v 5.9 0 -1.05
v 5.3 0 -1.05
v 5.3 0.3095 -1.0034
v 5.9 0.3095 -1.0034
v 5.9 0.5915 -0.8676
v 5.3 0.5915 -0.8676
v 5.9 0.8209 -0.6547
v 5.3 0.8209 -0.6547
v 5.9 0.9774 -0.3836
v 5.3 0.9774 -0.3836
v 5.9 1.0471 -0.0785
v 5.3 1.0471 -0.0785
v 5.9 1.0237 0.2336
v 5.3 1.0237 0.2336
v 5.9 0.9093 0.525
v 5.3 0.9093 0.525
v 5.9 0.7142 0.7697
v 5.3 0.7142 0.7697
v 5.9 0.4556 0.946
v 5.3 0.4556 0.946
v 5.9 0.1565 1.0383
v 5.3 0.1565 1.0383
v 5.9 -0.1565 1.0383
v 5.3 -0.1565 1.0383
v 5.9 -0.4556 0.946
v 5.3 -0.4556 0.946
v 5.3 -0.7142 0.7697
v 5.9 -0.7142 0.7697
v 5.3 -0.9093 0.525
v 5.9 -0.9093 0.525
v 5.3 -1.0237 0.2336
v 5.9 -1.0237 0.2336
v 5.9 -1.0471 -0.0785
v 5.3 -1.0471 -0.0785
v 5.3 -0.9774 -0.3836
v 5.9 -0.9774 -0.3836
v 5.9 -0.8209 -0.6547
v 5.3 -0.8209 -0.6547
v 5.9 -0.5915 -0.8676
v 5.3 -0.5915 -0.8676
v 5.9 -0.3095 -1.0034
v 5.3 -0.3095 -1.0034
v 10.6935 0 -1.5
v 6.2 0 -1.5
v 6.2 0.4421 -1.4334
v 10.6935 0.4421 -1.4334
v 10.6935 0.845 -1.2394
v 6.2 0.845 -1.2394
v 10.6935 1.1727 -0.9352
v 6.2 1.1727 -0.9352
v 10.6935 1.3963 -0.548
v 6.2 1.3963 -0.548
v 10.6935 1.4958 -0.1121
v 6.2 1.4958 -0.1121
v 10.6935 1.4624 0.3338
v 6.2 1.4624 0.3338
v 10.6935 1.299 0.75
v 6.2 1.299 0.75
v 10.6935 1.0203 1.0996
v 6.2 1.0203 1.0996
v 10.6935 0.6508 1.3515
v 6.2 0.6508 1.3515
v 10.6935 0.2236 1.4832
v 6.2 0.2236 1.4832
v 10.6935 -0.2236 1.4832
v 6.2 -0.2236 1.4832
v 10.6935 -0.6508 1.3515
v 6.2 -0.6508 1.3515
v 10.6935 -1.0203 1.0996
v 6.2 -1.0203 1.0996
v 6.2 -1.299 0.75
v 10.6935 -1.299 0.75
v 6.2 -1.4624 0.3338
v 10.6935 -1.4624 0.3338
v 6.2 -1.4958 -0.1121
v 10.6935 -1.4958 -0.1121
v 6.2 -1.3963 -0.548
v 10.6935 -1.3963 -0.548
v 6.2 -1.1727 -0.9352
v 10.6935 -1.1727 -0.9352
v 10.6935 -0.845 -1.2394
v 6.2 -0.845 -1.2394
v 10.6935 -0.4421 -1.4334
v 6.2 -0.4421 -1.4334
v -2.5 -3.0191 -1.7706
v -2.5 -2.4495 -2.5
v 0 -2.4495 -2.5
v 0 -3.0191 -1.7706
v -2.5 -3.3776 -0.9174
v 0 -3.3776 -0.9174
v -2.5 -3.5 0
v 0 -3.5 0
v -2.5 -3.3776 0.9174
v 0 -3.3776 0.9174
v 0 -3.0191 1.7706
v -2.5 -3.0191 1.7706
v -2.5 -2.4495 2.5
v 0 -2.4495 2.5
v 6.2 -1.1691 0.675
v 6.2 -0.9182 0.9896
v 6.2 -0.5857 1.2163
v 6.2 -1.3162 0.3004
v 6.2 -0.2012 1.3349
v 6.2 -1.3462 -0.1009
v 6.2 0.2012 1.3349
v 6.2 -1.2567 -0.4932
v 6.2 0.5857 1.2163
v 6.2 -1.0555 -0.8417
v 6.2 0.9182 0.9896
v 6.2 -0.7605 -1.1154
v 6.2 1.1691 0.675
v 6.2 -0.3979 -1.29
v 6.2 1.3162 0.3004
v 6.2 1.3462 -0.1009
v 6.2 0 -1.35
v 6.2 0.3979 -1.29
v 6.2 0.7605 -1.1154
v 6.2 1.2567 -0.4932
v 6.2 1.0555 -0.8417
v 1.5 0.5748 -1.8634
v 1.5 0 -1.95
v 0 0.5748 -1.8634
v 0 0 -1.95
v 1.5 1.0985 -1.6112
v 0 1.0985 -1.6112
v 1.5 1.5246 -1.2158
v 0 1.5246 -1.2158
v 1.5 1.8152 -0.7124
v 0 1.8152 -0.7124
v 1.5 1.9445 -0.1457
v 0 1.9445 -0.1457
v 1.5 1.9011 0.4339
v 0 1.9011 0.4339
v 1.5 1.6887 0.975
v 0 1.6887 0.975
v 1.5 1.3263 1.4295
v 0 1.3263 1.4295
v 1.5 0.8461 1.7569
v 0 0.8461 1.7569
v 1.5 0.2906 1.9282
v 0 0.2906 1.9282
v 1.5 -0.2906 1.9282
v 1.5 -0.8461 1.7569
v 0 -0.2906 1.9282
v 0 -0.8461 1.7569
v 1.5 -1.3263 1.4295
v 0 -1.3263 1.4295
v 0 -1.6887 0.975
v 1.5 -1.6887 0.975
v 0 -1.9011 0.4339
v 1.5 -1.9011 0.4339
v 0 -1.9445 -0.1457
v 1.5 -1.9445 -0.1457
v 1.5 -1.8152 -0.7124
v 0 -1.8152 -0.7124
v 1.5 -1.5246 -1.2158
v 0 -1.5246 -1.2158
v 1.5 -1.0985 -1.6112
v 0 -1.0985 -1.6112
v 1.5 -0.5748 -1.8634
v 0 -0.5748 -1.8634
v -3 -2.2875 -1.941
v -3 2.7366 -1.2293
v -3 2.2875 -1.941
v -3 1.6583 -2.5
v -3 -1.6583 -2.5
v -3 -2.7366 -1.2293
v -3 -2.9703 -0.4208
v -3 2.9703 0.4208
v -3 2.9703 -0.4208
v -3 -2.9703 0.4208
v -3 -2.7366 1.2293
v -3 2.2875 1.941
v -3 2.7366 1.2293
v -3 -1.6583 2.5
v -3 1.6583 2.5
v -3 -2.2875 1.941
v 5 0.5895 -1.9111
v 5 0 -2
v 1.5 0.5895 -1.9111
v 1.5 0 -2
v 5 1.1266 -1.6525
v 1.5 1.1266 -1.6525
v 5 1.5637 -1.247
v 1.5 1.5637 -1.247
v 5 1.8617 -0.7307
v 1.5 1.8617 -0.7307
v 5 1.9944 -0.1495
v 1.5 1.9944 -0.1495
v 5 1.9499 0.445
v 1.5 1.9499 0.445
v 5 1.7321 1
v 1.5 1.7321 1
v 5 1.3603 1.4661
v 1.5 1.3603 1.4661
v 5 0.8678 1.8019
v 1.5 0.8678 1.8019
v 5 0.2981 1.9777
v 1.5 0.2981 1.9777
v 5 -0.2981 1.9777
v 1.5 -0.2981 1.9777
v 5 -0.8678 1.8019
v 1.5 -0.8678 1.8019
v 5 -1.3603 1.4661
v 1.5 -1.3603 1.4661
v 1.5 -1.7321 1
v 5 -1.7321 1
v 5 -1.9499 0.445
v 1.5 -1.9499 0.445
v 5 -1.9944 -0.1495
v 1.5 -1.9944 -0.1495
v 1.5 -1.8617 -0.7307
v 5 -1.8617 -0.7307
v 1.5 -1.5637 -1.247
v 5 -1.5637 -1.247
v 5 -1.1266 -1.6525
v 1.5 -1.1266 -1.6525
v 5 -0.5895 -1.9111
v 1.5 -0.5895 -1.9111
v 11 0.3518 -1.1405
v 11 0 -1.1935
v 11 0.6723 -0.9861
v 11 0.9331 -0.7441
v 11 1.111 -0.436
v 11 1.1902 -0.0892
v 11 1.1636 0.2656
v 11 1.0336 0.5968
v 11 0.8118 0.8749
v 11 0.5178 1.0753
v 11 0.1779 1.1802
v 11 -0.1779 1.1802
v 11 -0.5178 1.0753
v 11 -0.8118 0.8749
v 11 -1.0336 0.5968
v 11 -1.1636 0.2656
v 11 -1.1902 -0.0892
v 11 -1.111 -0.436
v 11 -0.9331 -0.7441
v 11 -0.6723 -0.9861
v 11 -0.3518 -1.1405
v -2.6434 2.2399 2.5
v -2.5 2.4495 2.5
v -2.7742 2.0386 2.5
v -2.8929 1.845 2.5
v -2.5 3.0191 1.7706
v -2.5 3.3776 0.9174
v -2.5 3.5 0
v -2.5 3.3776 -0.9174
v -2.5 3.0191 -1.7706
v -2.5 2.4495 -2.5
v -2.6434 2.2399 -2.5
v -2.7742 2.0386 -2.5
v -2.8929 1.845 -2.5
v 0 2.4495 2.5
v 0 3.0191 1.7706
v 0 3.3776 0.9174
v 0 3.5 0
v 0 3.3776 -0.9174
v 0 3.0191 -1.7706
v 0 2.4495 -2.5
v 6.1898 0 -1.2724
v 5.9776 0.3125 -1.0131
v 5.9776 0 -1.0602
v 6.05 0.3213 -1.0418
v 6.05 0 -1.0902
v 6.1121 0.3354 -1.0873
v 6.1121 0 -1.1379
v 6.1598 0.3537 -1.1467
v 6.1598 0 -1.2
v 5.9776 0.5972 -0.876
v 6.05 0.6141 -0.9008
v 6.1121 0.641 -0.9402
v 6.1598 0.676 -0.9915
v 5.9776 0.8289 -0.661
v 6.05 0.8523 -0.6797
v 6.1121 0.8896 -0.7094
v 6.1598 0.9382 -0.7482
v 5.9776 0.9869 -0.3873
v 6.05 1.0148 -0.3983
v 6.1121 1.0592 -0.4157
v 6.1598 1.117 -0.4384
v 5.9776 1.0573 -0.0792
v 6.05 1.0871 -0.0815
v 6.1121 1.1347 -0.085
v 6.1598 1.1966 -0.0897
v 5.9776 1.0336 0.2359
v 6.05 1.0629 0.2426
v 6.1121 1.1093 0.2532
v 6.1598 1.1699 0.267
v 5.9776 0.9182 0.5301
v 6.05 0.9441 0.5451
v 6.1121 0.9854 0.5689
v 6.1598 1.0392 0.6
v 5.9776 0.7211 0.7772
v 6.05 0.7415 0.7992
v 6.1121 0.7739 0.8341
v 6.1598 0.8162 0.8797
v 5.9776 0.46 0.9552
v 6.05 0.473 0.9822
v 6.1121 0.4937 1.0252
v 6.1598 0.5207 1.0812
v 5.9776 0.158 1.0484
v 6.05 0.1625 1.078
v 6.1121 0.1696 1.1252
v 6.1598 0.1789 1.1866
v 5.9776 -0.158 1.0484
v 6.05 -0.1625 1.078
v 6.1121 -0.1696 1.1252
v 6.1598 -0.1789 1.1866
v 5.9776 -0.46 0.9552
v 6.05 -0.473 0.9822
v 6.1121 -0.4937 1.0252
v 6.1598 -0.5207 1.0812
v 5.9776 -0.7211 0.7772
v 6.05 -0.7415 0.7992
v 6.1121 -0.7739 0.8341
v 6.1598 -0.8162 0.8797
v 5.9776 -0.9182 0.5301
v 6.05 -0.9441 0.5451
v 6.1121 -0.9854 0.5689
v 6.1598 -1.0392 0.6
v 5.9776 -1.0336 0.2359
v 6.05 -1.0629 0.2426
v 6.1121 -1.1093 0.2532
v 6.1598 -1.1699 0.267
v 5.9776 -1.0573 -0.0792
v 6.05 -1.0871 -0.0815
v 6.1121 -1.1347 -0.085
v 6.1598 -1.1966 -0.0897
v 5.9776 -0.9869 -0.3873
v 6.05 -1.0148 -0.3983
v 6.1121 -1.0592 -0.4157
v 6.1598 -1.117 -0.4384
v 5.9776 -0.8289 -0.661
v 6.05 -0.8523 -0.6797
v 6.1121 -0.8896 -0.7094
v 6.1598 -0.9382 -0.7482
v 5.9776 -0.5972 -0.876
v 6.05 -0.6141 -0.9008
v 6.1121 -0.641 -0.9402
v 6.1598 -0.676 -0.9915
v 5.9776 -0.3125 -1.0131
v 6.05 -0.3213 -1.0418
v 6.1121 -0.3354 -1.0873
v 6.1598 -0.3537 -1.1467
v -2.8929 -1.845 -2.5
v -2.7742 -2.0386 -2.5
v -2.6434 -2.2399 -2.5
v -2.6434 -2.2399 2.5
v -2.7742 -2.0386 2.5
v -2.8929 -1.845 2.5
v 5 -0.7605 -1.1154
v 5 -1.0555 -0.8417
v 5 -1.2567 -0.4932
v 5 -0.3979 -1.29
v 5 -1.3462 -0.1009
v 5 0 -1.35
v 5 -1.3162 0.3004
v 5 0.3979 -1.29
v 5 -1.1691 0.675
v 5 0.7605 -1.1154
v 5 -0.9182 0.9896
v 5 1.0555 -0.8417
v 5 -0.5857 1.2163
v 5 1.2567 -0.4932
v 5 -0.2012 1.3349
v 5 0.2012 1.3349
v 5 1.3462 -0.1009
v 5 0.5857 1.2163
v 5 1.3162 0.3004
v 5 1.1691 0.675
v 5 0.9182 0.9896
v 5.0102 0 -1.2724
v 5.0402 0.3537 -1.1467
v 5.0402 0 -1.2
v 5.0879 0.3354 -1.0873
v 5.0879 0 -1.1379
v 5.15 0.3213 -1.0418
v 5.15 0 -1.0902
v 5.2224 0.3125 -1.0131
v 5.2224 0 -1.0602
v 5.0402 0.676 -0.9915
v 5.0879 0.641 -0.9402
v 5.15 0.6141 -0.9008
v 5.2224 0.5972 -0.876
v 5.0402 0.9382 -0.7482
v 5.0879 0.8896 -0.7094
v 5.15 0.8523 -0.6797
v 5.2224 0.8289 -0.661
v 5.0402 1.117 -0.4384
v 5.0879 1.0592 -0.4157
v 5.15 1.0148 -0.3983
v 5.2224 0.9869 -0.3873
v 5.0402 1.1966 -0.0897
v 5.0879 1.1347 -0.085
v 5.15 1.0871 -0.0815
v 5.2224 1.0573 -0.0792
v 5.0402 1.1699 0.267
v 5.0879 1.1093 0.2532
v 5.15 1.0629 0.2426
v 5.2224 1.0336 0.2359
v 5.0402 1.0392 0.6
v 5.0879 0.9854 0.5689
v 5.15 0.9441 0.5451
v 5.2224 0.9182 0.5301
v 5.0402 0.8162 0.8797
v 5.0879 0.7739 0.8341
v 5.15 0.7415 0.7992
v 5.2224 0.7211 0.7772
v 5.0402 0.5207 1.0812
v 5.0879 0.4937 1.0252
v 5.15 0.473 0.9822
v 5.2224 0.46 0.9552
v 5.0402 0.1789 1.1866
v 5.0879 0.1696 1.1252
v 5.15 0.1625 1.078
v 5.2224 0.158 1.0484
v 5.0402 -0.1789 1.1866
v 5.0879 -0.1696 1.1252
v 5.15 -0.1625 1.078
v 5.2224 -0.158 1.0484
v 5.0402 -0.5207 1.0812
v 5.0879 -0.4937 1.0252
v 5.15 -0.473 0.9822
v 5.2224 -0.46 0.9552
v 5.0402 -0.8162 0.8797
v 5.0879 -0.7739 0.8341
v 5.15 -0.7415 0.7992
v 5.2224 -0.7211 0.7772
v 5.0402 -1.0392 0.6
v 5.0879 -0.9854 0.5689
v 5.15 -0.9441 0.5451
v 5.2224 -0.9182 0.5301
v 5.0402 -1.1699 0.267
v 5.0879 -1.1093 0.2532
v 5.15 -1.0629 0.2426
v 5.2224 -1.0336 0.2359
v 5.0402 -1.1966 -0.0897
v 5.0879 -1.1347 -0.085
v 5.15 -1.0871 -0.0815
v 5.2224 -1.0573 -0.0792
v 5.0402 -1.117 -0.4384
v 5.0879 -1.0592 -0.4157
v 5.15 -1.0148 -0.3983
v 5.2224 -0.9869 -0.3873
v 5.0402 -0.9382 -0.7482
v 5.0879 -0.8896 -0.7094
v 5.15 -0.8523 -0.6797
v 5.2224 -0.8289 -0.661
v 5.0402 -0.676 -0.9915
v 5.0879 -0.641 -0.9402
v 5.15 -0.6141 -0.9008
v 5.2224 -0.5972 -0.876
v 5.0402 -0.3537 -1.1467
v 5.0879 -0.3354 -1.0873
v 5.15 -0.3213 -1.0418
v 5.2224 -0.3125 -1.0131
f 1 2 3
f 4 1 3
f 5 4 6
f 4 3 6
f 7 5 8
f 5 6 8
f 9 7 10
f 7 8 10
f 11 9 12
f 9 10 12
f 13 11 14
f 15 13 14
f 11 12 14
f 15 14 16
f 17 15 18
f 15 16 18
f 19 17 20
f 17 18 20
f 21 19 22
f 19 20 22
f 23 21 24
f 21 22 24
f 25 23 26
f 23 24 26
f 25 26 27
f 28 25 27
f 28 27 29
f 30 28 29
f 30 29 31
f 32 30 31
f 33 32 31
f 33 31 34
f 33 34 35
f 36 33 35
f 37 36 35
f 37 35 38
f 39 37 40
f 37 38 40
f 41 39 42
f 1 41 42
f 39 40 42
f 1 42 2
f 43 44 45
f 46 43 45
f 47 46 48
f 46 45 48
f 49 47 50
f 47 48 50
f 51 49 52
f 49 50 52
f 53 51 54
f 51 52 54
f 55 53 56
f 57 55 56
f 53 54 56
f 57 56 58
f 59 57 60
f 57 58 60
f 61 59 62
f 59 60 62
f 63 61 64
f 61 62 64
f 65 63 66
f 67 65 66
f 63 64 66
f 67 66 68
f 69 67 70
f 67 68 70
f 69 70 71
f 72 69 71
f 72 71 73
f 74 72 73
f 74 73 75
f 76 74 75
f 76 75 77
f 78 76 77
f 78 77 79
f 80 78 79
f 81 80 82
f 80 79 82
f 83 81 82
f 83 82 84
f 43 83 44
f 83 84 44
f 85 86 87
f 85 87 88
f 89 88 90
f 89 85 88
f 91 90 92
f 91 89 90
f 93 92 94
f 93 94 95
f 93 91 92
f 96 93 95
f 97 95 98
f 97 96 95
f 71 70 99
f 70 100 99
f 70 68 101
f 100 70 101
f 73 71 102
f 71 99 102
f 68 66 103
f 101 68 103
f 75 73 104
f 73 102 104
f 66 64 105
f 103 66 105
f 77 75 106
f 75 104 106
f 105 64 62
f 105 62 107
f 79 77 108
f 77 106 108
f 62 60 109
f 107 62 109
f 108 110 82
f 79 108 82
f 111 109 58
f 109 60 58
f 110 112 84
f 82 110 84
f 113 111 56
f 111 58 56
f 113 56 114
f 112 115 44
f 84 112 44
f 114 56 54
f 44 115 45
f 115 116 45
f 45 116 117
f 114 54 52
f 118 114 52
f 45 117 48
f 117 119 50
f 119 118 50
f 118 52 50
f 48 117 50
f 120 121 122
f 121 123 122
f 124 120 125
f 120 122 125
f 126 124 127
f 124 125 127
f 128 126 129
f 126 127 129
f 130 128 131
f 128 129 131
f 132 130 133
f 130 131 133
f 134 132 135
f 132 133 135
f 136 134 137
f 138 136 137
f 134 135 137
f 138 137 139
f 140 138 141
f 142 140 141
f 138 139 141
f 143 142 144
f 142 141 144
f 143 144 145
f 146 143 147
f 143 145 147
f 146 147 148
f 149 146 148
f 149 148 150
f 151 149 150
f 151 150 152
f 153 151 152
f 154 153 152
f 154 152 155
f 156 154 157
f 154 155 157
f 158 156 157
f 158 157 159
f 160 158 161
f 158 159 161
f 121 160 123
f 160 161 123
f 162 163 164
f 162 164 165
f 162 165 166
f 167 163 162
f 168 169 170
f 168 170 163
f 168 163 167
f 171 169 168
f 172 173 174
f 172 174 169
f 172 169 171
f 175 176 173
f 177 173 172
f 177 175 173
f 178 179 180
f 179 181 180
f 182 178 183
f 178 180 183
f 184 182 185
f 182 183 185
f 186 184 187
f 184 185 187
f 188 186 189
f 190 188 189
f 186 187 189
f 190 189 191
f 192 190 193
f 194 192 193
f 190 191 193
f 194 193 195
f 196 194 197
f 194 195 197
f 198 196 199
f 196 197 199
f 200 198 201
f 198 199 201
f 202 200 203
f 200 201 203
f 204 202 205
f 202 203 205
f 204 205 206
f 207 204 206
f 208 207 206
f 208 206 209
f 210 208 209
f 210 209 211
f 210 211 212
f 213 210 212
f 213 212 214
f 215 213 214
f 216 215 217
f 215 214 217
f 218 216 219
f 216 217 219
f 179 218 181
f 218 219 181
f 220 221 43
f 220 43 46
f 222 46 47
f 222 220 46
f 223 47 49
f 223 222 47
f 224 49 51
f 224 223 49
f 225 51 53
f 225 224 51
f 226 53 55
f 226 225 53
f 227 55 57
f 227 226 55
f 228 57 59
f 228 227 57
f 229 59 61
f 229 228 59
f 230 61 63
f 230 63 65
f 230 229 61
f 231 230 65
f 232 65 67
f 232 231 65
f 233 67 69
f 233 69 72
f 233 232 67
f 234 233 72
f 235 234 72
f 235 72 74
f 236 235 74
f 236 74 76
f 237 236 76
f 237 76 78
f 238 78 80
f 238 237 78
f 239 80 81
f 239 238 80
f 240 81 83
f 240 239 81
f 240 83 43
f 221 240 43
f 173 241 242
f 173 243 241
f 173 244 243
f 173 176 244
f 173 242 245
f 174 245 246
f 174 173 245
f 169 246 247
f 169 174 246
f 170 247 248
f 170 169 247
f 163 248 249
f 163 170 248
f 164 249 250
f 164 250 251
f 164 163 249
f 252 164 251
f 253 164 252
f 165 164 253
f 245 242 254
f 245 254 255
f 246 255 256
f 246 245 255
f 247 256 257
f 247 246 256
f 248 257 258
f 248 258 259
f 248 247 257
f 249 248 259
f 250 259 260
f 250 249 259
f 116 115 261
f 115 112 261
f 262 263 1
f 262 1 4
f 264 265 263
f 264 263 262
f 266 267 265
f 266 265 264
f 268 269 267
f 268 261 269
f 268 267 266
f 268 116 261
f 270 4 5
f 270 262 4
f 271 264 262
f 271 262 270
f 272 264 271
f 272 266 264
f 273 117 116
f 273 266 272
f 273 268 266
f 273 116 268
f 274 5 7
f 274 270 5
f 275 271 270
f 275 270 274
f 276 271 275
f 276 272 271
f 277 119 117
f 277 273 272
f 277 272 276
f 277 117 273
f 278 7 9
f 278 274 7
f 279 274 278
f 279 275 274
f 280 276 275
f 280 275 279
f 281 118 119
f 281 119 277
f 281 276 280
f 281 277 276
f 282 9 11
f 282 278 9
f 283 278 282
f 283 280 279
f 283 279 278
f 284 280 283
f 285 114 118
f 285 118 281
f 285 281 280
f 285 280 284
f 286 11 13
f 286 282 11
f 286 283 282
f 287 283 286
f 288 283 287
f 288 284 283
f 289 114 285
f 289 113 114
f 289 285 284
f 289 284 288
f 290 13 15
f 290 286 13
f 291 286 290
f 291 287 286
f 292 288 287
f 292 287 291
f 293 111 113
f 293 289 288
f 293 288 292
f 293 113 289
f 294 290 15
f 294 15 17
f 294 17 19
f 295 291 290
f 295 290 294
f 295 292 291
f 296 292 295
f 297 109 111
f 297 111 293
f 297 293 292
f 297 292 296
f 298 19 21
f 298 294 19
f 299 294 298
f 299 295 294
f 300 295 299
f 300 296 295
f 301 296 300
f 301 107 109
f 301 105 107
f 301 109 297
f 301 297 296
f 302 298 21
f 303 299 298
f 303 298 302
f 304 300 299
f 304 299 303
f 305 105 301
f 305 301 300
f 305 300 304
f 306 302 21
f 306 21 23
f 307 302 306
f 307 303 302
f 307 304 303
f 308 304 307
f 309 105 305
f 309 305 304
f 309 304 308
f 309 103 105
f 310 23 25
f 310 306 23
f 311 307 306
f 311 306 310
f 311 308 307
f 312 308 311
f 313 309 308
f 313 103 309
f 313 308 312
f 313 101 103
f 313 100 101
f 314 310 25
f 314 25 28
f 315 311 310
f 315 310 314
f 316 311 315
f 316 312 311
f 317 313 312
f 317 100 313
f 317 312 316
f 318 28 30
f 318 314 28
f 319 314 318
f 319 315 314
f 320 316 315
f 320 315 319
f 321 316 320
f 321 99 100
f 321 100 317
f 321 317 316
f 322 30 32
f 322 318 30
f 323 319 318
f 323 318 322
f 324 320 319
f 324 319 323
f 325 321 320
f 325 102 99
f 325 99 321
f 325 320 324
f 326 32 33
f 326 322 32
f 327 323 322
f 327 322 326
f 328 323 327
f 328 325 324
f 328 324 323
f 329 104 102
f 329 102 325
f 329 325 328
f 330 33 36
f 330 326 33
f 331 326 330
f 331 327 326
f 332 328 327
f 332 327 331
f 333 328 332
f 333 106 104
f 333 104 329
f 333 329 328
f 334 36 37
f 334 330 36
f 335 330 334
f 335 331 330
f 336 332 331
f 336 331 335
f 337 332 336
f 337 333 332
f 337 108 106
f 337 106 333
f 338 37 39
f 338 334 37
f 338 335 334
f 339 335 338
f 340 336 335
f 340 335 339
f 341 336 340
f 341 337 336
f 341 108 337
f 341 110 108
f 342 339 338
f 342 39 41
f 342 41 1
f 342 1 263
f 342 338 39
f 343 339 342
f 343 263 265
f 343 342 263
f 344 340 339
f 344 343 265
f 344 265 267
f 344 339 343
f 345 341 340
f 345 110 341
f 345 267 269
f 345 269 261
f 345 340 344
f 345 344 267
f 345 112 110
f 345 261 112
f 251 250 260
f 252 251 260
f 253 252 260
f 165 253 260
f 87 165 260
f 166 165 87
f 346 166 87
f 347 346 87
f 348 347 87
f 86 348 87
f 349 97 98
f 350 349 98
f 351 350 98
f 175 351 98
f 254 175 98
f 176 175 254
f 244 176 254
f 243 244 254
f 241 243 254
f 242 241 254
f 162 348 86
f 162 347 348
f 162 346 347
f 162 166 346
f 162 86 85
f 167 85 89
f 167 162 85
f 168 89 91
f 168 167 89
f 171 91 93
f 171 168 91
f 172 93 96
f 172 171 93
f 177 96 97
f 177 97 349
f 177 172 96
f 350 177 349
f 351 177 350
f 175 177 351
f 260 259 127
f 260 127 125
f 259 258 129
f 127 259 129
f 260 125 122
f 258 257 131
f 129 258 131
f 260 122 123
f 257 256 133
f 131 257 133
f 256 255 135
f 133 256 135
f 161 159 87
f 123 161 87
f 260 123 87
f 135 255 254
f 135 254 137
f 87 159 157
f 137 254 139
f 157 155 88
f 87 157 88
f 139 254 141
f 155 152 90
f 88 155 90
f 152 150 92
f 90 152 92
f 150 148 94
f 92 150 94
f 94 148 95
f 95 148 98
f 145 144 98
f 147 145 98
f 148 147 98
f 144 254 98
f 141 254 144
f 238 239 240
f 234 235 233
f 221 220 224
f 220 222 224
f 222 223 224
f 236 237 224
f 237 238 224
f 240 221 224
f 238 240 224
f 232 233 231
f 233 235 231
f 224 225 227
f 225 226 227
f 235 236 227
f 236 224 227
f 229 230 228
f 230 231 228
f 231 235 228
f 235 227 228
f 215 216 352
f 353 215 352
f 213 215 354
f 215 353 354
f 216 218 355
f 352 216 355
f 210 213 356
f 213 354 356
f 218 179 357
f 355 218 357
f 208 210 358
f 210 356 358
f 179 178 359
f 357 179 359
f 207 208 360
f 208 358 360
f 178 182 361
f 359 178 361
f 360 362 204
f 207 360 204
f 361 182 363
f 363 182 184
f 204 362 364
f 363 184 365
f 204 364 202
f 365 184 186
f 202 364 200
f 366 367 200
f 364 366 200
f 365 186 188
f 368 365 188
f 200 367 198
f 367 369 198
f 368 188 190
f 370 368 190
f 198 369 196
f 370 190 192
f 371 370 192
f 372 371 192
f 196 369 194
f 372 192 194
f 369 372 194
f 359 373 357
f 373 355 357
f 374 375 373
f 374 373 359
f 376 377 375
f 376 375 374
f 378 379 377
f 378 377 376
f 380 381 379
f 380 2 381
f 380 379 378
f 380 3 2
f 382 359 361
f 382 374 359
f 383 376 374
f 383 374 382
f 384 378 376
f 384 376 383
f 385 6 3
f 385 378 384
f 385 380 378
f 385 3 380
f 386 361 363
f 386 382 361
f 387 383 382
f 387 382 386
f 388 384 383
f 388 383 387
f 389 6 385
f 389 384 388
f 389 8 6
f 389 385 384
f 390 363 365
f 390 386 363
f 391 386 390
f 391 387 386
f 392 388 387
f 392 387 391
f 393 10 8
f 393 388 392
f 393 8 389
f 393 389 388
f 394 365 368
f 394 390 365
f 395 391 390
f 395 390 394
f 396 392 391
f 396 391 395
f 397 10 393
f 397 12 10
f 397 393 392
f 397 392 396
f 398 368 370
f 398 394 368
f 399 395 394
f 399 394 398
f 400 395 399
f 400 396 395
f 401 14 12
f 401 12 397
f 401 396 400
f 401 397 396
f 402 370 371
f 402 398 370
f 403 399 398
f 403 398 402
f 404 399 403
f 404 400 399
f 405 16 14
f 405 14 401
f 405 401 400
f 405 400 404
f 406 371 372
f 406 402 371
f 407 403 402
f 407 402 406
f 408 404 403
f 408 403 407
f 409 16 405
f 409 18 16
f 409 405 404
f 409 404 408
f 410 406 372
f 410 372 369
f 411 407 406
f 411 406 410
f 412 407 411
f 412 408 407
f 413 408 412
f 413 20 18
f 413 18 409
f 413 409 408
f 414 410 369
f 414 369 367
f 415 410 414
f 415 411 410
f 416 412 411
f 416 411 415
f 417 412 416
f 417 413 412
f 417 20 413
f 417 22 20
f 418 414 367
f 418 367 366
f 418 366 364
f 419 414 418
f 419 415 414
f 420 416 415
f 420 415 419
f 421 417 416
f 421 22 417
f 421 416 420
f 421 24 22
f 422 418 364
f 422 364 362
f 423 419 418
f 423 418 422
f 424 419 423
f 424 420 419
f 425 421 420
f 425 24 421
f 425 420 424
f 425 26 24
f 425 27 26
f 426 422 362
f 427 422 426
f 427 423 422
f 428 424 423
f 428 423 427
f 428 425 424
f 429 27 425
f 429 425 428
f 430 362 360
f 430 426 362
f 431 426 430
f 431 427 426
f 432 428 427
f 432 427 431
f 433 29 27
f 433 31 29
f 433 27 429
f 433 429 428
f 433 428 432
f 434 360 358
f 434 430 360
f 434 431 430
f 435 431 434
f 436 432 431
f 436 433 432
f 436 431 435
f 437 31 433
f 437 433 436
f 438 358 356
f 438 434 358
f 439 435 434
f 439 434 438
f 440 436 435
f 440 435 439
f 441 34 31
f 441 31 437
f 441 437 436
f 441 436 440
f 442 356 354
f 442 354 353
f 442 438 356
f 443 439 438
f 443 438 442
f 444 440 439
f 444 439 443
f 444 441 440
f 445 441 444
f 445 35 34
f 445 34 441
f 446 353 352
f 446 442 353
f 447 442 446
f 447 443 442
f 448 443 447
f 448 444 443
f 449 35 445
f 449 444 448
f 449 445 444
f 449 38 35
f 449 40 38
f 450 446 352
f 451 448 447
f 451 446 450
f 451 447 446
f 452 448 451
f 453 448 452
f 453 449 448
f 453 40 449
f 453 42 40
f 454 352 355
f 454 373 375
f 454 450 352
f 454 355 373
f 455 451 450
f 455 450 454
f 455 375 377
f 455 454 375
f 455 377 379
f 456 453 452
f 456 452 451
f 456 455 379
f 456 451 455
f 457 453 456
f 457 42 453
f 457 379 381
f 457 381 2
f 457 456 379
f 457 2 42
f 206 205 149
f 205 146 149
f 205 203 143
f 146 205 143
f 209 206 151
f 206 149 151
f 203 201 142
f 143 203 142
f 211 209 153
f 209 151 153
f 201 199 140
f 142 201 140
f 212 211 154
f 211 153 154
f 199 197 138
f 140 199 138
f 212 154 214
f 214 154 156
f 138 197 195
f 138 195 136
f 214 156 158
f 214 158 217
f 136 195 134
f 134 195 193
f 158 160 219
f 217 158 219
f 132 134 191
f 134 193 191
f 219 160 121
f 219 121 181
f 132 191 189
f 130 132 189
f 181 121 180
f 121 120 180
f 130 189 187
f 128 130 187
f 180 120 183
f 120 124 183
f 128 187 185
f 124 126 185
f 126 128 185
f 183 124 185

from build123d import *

# Parameters (mm, degrees)
EXTRUDE_1_DEPTH = 3
CHAMFER_1_SIZE  = 0.3065
CHAMFER_2_SIZE  = 0.5
FILLET_1_R      = 0.3


with BuildPart() as part:
    # 草圖1 → 填料-伸長1 (new body)
    with BuildSketch(Plane(origin=(-3, 0, 0), x_dir=(0, -1, 0), z_dir=(-1, 0, 0))):
        with BuildLine():
            Line((2.449489743, 2.5), (-2.449489743, 2.5))
            ThreePointArc((-2.449489743, 2.5), (-3.5, 0), (-2.449489743, -2.5))
            Line((-2.449489743, -2.5), (2.449489743, -2.5))
            ThreePointArc((2.449489743, -2.5), (3.5, 0), (2.449489743, 2.5))
        make_face()
    extrude(amount=-EXTRUDE_1_DEPTH)

    # 草圖2 → 旋轉1 (revolve)
    with BuildSketch(Plane.XY, mode=Mode.PRIVATE) as revolve_1_sk:
        Polygon((0, 1.95), (0, 0), (11, 0), (11, 1.5), (6.2, 1.5), (6.2, 1.05), (5, 1.05), (5, 2), (1.5, 2), (1.5, 1.95), align=None)
    revolve(revolve_1_sk.sketch.rotate(Axis((0, 0, 0), (1, 0, 0)), 270), axis=Axis((0, 0, 0), (1, 0, 0)))

    # 導角1
    chamfer_1_edges = [part.edges().sort_by_distance(p)[0] for p in [
        (11, 0, 1.5),
    ]]
    chamfer(chamfer_1_edges, length=CHAMFER_1_SIZE)

    # 導角2
    chamfer_2_edges = [part.edges().sort_by_distance(p)[0] for p in [
        (-3, 3.5, 0),
        (-3, -3.5, 0),
    ]]
    chamfer(chamfer_2_edges, length=CHAMFER_2_SIZE)

    # 圓角1
    fillet_1_edges = [part.edges().sort_by_distance(p)[0] for p in [
        (6.2, 0, 1.05),
        (5, 0, 1.05),
    ]]
    fillet(fillet_1_edges, radius=FILLET_1_R)


solid = part.part
